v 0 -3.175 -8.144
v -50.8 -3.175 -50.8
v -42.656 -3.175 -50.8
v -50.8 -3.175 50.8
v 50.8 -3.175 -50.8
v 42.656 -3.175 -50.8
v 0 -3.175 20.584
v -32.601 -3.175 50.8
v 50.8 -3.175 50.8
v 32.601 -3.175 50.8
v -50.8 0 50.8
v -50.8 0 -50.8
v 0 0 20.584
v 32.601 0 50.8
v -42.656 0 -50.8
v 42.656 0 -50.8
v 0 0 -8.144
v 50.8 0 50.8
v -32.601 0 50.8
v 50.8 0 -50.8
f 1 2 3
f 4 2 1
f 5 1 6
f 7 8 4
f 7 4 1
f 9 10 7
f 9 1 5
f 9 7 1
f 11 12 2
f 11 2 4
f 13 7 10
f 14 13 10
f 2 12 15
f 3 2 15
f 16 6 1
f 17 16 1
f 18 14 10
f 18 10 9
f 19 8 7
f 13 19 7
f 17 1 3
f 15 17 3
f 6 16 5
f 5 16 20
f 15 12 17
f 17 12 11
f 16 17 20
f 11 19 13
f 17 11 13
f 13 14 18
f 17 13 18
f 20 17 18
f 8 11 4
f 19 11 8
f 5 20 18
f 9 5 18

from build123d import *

# Parameters (mm, degrees)
F0_W     = 101.6
F0_H     = 101.6
F1_DEPTH = 3.175
F3_DEPTH = 3.176
F5_DEPTH = 25.4


with BuildPart() as f1:
    # F0 (on Front) → F1 (new body)
    with BuildSketch(Plane.XZ):
        Rectangle(F0_W, F0_H)
    extrude(amount=F1_DEPTH)

    # F2 (on face) → F3 (cut, through all)
    with BuildSketch(Plane.XZ.offset(3.175)):
        Polygon((32.6009, 50.8), (-32.6009, 50.8), (0, 20.584378), align=None)
    extrude(amount=-F3_DEPTH, mode=Mode.SUBTRACT)

    # F4 (on face) → F5 (cut)
    with BuildSketch(Plane.XZ.offset(3.175)):
        Polygon((0, -8.143783), (-42.656217, -50.8), (42.656217, -50.8), align=None)
    extrude(amount=-F5_DEPTH, mode=Mode.SUBTRACT)


solid = f1.part
